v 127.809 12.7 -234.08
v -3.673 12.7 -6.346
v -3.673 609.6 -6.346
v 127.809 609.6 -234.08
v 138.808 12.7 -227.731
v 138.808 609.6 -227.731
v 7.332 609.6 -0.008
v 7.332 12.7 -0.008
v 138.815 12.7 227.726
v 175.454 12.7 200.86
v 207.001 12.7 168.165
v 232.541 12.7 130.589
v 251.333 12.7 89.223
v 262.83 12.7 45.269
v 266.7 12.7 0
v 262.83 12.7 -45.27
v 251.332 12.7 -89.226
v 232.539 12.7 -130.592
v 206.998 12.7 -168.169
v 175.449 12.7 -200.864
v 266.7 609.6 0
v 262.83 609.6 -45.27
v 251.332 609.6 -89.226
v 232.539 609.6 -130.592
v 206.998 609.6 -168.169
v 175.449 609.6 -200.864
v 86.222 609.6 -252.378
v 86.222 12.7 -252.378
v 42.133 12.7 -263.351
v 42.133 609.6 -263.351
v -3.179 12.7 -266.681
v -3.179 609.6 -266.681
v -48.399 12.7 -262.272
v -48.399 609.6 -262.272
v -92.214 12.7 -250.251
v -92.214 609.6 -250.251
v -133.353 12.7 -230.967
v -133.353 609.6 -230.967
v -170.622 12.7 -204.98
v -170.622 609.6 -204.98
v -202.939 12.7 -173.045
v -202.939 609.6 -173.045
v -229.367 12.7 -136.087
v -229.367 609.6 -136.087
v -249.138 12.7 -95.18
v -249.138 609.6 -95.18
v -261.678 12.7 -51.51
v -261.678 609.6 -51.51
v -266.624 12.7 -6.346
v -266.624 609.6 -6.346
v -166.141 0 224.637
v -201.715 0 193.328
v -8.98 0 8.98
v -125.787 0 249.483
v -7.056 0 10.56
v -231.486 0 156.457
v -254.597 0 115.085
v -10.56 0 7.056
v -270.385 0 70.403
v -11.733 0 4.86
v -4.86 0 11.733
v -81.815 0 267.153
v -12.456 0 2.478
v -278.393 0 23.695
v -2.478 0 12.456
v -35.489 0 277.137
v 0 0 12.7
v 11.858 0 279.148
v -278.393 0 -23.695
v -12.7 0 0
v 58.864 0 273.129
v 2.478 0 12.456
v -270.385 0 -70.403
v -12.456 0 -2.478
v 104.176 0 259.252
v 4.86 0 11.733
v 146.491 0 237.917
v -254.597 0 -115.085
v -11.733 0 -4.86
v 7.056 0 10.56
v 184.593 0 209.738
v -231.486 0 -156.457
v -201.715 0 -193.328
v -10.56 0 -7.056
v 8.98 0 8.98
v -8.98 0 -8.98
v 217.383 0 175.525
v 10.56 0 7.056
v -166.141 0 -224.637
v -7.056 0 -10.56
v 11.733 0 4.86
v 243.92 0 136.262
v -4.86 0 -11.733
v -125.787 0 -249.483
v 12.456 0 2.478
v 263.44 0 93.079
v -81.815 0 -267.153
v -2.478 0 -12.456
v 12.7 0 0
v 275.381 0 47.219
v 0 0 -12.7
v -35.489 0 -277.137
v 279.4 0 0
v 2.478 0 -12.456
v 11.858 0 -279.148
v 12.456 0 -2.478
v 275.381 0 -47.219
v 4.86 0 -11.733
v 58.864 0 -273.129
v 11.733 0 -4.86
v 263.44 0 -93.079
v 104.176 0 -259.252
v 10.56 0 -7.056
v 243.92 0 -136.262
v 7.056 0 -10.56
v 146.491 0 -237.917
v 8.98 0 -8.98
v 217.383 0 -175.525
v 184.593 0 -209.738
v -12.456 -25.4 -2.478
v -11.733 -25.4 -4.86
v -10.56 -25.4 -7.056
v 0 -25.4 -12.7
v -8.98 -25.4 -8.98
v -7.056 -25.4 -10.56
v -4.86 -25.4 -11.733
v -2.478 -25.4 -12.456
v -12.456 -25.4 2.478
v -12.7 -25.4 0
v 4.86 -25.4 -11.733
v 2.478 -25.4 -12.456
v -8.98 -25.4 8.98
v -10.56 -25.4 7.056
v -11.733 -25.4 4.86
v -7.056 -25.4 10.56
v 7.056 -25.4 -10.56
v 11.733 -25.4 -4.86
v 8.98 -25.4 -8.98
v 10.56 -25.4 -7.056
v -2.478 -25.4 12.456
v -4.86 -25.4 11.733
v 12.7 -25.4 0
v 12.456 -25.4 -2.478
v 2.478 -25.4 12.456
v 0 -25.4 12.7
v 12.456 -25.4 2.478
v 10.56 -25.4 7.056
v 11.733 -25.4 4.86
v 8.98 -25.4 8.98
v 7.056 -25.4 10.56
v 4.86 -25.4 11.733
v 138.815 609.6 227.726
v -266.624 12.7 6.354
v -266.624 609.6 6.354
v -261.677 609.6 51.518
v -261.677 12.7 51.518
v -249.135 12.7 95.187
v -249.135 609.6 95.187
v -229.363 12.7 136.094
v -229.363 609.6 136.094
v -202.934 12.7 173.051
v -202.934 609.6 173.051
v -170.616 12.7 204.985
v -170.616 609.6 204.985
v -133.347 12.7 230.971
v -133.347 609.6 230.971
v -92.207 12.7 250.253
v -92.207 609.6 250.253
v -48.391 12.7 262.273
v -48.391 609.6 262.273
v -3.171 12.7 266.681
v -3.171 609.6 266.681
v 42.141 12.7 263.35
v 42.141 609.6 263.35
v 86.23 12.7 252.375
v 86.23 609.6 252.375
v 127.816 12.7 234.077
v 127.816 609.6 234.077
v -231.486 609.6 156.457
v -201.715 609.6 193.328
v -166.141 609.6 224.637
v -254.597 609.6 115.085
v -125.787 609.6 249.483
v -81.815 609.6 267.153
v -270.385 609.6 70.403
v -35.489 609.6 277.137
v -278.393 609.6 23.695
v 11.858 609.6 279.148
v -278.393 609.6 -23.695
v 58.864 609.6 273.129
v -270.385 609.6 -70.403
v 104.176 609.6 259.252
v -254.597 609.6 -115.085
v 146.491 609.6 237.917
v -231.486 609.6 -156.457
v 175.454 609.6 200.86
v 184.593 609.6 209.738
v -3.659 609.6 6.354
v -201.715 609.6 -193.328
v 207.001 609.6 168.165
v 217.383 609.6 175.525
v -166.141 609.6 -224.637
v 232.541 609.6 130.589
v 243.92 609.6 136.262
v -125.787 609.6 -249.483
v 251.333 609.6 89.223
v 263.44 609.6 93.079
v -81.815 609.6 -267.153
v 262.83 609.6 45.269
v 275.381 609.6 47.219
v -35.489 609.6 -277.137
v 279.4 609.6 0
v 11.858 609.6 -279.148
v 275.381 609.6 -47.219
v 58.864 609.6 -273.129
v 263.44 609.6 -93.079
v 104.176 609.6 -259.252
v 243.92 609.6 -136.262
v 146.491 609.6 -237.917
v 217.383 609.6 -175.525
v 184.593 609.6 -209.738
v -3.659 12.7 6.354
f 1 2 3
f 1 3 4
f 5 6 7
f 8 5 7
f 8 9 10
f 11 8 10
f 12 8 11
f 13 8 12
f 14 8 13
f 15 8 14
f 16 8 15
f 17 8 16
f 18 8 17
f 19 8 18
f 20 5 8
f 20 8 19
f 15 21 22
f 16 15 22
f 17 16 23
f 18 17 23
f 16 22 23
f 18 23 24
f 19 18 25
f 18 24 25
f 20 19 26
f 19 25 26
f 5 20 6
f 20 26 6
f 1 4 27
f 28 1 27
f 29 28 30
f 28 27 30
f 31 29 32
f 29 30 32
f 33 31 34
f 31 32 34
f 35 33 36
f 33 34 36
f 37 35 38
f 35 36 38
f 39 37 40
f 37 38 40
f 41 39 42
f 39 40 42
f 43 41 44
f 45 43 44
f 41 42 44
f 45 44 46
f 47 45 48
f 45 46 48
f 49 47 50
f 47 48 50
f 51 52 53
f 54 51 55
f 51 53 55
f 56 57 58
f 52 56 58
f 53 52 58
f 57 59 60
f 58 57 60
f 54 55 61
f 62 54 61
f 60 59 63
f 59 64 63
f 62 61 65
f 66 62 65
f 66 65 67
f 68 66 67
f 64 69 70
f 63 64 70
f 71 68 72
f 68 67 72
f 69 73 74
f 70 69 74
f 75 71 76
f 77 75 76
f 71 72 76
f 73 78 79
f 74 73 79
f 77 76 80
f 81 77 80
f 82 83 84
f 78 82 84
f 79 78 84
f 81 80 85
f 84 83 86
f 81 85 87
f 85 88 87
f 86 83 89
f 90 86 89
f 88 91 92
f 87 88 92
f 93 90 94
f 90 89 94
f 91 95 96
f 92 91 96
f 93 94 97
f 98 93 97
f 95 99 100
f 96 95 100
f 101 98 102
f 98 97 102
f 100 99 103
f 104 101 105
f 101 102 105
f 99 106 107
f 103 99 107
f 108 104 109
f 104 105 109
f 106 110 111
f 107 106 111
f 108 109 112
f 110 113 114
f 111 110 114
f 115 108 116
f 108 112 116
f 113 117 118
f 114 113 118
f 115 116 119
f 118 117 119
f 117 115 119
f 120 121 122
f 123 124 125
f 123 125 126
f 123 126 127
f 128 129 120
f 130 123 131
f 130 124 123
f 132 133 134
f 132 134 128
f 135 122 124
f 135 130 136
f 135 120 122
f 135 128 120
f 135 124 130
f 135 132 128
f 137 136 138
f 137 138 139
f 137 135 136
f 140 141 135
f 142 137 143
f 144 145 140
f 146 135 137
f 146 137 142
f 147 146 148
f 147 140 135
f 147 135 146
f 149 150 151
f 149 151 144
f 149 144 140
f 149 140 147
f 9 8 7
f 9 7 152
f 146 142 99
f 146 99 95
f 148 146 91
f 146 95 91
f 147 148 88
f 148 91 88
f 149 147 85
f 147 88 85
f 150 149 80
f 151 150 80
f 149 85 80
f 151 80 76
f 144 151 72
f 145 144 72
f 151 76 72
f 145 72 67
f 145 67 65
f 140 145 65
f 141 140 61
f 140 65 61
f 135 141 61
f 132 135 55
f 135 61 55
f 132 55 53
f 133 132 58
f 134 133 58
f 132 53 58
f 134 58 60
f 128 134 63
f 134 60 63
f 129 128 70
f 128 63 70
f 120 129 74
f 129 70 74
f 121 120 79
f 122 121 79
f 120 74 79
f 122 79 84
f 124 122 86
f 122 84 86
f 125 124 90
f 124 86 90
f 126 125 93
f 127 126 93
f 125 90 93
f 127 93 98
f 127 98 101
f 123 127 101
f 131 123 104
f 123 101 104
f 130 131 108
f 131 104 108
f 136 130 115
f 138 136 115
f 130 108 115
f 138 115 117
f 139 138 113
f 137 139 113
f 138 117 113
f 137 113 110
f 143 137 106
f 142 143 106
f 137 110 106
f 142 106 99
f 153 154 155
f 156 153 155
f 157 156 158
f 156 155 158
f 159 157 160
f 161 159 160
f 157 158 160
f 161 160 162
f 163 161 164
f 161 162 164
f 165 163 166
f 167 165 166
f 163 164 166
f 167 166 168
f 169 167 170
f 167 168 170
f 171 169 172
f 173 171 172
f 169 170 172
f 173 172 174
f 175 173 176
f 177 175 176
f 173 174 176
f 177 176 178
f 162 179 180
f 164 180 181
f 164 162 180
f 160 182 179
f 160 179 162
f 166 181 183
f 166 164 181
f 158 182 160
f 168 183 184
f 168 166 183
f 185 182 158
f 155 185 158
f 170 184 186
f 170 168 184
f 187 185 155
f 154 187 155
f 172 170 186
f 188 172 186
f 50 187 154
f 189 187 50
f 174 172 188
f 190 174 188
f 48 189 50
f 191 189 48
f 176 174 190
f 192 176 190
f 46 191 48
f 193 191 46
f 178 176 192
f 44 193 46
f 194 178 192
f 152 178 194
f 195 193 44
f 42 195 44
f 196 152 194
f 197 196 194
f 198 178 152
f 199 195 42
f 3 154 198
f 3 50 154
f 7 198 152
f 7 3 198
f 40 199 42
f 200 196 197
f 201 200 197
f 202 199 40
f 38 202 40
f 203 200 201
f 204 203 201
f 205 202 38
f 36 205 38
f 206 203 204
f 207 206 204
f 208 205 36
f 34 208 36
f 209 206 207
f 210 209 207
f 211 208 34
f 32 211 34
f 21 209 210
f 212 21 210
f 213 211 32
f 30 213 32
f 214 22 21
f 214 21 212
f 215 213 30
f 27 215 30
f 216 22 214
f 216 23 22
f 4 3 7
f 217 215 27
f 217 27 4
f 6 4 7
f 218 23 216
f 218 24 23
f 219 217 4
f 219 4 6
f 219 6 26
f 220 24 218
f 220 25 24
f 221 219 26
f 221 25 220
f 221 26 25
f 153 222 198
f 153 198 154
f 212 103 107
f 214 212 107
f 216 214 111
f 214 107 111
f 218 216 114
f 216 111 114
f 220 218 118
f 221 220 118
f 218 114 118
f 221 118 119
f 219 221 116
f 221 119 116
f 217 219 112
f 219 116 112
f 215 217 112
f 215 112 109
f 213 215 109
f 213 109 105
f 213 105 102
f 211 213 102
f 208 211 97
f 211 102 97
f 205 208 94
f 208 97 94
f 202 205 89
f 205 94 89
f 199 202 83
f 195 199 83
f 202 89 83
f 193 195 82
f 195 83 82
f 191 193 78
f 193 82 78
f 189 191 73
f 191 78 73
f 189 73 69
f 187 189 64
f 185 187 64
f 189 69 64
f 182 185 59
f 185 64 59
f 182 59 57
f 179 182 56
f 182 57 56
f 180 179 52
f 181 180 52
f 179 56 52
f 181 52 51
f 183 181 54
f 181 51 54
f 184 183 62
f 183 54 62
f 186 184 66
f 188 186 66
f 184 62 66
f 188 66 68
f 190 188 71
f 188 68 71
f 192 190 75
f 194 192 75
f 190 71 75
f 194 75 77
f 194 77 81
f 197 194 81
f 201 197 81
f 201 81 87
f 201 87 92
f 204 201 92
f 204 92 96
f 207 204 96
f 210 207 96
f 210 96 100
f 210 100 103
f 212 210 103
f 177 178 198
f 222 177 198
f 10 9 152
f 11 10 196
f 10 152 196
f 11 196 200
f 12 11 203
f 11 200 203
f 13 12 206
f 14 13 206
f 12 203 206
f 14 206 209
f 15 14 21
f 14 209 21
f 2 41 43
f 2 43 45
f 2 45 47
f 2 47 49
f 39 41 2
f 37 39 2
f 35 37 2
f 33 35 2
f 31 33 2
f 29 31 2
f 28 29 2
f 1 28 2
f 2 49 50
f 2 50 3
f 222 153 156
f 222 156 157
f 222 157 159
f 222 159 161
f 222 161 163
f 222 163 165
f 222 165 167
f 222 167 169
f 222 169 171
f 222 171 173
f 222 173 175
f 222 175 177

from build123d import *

# Parameters (mm, degrees)
SKETCH1_R           = 279.4
BOSS_EXTRUDE1_DEPTH = 609.6
CUT_EXTRUDE1_DEPTH  = 596.9
SKETCH4_R           = 12.7
BOSS_EXTRUDE2_DEPTH = 25.4


with BuildPart() as part:
    # Sketch1 → Boss-Extrude1 (new body)
    with BuildSketch(Plane(origin=(0, 0, 0), x_dir=(1, 0, 0), z_dir=(0, 1, 0))):
        Circle(SKETCH1_R)
    extrude(amount=BOSS_EXTRUDE1_DEPTH)

    # Sketch3 → Cut-Extrude1 (cut)
    with BuildSketch(Plane(origin=(0, 609.6, 0), x_dir=(1, 0, 0), z_dir=(0, 1, 0))):
        with BuildLine():
            ThreePointArc((127.809487072, 234.080381524), (-133.353402796, 230.967010551), (-266.624487569, 6.346071887))
            Line((-266.624487569, 6.346071887), (-3.672977901, 6.346071887))
            Line((-3.672977901, 6.346071887), (127.809487072, 234.080381524))
        make_face()
        with BuildLine():
            Line((-3.659370518, -6.353928113), (-266.624300463, -6.353928113))
            ThreePointArc((-266.624300463, -6.353928113), (-133.346597175, -230.970939778), (127.816384316, -234.07661545))
            Line((127.816384316, -234.07661545), (-3.659370518, -6.353928113))
        make_face()
        with BuildLine():
            ThreePointArc((266.7, 0), (232.539255974, 130.592436348), (138.808103253, 227.730543563))
            Line((138.808103253, 227.730543563), (7.332348419, 0.007856226))
            Line((7.332348419, 0.007856226), (138.814813391, -227.726453411))
            ThreePointArc((138.814813391, -227.726453411), (232.541179935, -130.589010389), (266.7, 0))
        make_face()
    extrude(amount=-CUT_EXTRUDE1_DEPTH, mode=Mode.SUBTRACT)

    # Sketch4 → Boss-Extrude2 (add)
    with BuildSketch(Plane.XZ):
        Circle(SKETCH4_R)
    extrude(amount=BOSS_EXTRUDE2_DEPTH)


solid = part.part
